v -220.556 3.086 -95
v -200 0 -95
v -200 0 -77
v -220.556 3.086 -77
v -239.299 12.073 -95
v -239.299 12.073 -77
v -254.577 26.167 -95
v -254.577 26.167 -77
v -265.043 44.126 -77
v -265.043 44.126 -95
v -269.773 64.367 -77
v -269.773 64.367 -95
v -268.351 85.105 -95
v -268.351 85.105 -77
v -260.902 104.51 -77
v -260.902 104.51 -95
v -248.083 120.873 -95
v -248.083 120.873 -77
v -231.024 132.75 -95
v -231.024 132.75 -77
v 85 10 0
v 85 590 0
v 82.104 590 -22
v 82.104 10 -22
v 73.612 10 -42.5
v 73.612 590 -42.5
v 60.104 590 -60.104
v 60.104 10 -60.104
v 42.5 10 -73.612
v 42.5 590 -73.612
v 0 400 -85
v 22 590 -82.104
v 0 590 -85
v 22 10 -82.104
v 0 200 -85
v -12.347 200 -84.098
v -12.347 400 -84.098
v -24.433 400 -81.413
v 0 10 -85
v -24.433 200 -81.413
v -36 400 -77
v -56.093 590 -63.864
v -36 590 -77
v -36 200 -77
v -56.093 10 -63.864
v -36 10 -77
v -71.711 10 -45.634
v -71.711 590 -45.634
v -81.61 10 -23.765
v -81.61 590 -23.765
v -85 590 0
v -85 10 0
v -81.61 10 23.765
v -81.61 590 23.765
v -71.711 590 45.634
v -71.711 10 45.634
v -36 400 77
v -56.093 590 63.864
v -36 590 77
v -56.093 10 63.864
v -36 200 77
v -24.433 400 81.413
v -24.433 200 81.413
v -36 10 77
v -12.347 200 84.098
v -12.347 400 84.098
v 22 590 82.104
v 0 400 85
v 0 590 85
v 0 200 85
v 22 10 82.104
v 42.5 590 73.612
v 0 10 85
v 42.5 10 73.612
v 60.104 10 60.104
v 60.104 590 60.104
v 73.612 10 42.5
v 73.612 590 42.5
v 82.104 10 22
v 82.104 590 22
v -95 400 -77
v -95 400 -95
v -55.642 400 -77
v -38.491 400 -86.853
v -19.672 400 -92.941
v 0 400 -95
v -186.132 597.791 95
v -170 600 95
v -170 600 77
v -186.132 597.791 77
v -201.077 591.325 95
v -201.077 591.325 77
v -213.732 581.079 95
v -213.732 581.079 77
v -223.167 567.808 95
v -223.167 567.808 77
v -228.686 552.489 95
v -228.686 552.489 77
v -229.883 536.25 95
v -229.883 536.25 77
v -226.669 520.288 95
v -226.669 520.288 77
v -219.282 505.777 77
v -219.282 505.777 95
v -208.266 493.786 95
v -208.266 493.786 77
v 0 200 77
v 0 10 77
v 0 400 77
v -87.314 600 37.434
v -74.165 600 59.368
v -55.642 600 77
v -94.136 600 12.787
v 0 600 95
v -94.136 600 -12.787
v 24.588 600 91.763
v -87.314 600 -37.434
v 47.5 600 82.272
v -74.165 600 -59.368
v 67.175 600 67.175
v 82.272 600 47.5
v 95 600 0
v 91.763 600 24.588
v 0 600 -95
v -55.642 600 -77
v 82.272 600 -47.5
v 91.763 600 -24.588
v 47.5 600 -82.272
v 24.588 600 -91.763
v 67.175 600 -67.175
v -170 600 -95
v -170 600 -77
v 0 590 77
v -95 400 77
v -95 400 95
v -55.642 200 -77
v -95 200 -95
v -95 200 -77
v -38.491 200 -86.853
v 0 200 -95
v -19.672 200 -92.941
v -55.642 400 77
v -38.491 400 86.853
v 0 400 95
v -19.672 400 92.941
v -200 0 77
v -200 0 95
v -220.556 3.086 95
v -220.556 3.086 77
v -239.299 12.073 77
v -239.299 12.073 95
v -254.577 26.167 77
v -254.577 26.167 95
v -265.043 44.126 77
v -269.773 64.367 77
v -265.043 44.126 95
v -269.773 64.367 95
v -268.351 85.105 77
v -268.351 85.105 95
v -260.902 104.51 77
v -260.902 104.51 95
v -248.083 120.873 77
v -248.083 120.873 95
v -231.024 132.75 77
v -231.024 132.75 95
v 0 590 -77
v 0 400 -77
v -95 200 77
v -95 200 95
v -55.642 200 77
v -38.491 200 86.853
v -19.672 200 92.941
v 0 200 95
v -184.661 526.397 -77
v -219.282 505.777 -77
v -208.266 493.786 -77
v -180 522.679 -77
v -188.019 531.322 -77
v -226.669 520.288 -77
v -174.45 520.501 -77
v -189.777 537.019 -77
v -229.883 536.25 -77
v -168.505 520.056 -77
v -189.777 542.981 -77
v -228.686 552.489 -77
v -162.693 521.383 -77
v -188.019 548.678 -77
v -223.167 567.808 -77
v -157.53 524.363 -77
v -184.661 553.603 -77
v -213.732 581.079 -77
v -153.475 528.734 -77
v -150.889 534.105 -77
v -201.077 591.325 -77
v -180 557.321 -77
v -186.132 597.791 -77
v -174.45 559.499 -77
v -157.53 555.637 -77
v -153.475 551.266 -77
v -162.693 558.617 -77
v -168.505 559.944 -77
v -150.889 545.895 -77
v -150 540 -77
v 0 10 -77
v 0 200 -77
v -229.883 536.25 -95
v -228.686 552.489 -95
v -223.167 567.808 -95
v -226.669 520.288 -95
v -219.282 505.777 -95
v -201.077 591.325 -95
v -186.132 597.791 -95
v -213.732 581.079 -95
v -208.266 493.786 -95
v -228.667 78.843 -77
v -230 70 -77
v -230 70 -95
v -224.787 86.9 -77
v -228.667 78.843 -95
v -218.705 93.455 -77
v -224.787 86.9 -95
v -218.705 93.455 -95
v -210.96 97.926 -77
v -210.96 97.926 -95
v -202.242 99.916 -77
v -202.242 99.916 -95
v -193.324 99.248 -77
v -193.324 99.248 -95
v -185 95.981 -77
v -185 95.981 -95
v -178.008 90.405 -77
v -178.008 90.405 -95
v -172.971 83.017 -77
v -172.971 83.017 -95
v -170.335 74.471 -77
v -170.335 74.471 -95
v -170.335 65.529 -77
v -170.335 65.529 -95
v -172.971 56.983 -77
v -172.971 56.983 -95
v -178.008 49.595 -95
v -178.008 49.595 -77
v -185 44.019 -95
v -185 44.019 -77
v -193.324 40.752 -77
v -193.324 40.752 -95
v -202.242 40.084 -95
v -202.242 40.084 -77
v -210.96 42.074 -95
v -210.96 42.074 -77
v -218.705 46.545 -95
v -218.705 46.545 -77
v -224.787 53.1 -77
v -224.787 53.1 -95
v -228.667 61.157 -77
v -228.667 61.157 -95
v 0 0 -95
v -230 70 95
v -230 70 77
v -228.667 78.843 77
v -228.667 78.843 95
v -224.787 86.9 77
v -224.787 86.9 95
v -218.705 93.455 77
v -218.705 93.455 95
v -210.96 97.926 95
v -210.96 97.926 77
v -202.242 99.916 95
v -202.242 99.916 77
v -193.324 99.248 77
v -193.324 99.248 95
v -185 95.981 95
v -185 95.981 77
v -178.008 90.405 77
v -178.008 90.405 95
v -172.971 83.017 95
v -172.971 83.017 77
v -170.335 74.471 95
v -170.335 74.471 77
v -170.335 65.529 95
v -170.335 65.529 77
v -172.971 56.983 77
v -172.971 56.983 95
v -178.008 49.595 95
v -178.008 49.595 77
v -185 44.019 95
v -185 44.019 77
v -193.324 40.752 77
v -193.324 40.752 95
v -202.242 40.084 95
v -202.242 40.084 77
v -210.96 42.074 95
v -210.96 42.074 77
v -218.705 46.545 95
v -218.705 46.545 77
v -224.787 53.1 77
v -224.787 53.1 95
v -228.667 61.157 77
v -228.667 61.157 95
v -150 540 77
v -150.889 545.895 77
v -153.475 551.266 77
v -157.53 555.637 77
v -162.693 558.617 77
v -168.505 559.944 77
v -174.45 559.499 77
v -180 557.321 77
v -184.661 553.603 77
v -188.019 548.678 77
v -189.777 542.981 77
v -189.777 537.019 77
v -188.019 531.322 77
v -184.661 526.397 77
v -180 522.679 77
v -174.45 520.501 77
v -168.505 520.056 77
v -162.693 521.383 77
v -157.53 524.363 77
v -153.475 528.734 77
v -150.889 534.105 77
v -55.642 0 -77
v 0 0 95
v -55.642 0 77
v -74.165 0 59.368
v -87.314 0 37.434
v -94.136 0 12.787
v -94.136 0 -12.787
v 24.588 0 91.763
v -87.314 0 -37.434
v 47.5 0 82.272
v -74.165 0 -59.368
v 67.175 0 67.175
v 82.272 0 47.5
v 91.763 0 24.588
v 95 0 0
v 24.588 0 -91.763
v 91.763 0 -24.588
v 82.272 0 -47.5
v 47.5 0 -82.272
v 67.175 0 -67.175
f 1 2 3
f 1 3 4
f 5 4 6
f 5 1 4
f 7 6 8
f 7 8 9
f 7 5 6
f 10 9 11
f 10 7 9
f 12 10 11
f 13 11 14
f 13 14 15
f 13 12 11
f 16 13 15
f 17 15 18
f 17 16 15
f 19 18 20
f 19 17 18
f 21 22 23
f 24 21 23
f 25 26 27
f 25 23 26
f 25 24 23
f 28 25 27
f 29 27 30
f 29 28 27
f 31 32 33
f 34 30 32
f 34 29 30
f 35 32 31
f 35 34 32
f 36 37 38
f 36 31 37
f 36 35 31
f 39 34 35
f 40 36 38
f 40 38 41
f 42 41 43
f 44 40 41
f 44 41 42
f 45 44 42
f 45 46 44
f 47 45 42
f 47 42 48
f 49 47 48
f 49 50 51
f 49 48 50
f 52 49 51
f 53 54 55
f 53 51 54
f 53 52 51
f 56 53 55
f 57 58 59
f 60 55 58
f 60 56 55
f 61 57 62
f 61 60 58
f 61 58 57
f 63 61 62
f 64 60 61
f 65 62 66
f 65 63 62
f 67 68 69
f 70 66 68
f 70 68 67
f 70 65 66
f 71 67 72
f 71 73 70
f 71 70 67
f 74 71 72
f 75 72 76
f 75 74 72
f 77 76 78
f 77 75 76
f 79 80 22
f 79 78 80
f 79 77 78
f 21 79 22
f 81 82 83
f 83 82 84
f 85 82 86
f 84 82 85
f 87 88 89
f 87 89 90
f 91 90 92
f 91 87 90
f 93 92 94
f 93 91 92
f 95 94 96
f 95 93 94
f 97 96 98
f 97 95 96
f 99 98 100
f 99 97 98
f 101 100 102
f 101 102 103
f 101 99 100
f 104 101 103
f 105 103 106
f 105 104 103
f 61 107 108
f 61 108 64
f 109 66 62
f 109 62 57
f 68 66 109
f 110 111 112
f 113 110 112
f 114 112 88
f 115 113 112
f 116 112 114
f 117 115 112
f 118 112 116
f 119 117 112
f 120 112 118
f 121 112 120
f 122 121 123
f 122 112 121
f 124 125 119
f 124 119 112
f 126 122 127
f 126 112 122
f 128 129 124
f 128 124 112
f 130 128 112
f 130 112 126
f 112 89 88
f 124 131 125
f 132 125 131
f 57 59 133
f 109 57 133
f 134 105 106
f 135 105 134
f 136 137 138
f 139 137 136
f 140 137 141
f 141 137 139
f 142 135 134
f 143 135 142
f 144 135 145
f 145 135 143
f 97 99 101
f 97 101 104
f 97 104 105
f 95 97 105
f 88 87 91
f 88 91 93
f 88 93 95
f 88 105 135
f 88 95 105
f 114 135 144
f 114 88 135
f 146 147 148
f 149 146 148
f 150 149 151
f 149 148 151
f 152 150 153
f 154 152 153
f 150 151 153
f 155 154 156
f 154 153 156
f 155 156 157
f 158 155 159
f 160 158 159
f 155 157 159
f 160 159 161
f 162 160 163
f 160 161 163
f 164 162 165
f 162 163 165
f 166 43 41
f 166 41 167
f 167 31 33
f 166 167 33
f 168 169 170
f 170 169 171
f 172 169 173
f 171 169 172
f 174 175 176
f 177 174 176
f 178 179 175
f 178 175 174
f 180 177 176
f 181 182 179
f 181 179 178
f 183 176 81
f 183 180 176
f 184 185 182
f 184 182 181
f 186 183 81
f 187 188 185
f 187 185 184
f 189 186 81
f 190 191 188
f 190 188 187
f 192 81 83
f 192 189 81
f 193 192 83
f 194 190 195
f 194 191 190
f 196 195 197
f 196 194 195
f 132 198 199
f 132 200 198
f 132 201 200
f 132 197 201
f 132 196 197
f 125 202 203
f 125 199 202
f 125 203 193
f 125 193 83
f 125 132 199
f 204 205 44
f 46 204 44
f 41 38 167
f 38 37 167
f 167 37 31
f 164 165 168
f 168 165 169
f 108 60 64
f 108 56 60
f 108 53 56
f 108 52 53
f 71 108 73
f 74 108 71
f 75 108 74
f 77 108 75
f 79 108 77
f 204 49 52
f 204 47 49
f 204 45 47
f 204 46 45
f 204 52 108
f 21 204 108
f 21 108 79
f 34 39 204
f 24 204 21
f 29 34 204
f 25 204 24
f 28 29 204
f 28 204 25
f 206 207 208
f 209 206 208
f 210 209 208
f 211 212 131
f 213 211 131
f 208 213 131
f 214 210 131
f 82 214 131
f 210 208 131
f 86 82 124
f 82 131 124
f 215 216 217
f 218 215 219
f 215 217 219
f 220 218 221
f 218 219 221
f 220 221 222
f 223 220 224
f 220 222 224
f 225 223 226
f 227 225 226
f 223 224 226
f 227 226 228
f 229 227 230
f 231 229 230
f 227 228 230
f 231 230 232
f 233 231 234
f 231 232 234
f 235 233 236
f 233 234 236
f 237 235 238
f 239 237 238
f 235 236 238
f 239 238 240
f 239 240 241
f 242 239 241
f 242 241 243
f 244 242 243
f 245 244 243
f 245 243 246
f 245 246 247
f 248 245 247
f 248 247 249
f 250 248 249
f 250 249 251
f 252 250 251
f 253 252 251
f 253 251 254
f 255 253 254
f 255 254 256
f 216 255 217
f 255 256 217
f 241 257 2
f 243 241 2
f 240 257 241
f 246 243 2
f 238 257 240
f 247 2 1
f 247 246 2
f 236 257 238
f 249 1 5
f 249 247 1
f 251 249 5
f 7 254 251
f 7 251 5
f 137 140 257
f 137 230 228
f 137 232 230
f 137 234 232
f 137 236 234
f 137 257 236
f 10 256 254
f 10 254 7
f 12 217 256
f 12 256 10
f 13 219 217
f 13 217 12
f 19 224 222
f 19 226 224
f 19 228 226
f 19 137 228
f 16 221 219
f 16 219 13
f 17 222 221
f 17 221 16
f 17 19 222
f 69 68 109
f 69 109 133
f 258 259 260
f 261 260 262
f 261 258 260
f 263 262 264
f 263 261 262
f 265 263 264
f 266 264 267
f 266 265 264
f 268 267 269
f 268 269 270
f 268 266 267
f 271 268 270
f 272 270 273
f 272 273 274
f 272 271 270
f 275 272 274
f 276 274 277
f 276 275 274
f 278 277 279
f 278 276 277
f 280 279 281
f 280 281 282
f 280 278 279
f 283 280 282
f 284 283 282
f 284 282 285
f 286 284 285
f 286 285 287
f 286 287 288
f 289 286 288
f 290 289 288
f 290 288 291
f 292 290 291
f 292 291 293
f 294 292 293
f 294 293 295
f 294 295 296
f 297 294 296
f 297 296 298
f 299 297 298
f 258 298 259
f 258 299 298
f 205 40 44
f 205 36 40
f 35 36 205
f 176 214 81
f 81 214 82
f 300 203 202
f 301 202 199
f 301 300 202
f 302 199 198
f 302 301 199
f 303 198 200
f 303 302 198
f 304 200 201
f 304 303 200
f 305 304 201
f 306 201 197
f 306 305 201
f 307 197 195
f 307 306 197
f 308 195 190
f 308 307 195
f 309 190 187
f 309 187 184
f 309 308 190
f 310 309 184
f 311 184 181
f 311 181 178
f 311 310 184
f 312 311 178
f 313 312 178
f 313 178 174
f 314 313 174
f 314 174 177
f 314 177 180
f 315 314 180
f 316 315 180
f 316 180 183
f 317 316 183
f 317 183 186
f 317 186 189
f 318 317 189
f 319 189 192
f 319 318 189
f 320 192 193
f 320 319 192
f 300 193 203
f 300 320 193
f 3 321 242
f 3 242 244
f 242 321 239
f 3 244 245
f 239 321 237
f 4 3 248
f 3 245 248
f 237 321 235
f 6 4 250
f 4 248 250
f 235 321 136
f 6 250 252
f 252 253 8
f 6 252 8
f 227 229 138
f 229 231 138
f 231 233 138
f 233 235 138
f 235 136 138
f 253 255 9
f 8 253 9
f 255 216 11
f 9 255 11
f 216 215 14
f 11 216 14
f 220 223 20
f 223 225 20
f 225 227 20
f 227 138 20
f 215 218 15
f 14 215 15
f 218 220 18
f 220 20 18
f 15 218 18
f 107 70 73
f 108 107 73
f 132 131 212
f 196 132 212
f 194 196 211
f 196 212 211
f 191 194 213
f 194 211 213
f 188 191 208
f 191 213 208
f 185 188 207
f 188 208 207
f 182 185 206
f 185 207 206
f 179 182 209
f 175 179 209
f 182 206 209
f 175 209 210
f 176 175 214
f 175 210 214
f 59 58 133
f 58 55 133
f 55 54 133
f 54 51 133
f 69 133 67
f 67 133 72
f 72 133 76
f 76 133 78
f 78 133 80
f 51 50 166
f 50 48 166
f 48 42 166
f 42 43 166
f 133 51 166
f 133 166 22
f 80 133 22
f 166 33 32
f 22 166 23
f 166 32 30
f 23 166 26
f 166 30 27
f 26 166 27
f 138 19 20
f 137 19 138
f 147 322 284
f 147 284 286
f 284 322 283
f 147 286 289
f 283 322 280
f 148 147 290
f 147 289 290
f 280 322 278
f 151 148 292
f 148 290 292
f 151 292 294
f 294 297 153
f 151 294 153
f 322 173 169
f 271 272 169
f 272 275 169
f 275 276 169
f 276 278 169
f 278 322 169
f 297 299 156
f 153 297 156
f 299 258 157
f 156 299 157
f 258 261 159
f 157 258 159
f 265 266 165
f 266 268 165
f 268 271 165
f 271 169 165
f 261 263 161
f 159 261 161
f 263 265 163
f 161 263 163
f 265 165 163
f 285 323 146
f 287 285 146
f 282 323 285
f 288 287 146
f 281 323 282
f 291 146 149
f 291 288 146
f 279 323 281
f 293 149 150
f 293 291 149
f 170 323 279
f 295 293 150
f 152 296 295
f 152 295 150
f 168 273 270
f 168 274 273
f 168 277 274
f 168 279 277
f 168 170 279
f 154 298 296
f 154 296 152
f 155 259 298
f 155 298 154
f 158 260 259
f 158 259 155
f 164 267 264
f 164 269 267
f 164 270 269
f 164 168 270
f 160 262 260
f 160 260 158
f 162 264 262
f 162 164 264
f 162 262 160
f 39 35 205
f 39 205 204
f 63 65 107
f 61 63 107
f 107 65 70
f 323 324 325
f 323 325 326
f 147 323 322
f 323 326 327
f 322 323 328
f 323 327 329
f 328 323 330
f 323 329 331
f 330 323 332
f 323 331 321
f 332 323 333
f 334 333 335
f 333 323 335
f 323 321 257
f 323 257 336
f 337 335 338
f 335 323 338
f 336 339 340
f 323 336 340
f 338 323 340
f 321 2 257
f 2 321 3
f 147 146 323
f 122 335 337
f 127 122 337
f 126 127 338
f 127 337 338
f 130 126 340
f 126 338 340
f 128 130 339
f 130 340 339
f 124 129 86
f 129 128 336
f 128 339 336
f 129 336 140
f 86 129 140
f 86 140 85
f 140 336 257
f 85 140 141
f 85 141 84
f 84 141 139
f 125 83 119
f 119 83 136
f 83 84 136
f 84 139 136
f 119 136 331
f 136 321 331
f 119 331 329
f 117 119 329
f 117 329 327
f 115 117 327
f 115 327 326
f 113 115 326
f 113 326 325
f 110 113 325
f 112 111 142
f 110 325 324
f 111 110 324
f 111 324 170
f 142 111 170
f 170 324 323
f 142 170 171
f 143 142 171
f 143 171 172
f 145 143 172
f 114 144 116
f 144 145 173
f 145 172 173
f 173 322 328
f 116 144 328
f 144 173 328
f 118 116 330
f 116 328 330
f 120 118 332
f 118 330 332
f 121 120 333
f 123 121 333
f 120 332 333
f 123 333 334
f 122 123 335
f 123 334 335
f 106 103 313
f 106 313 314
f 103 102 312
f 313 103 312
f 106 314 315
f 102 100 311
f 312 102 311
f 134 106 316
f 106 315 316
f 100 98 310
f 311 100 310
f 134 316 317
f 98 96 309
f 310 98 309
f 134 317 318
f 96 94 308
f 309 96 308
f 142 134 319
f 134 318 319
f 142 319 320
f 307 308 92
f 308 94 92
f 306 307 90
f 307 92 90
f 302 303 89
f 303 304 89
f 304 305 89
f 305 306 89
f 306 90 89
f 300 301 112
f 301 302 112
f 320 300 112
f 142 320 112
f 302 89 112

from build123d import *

# Parameters (mm, degrees)
SKETCH1_R           = 95
BOSS_EXTRUDE1_DEPTH = 600
SHELL1_T            = 10
SKETCH2_R           = 30
BOSS_EXTRUDE2_DEPTH = 18
SKETCH4_R           = 20
BOSS_EXTRUDE3_DEPTH = 95


with BuildPart() as part:
    # Sketch1 → Boss-Extrude1 (new body)
    with BuildSketch(Plane(origin=(0, 0, 0), x_dir=(1, 0, 0), z_dir=(0, 1, 0))):
        Circle(SKETCH1_R)
    extrude(amount=BOSS_EXTRUDE1_DEPTH)

    # Shell1 (no face opened: a closed hollow body)
    add(offset(amount=-SHELL1_T, mode=Mode.PRIVATE), mode=Mode.SUBTRACT)

    # Sketch2 → Boss-Extrude2 (add)
    with BuildSketch(Plane(origin=(0, 0, -95), x_dir=(-1, 0, 0), z_dir=(0, 0, -1))):
        with BuildLine():
            Line((0, 0), (95, 0))
            Line((95, 0), (200, 0))
            ThreePointArc((200, 0), (268.163356789, 54.070254514), (231.023569289, 132.749805964))
            Line((231.023569289, 132.749805964), (95, 200))
            Line((95, 200), (0, 200))
            Line((0, 200), (0, 0))
        make_face()
        with Locations((200, 70)):
            Circle(SKETCH2_R, mode=Mode.SUBTRACT)
        with BuildLine():
            Line((0, 600), (95, 600))
            Line((95, 600), (170, 600))
            ThreePointArc((170, 600), (226.448348767, 560.336762809), (208.265889327, 493.786130718))
            Line((208.265889327, 493.786130718), (95, 400))
            Line((95, 400), (0, 400))
            Line((0, 400), (0, 600))
        make_face()
    boss_extrude2 = extrude(amount=-BOSS_EXTRUDE2_DEPTH)

    # Mirror1: Boss-Extrude2 across plane
    add(boss_extrude2.mirror(Plane(origin=(0, 0, 0), x_dir=(1, 0, 0), z_dir=(0, 0, -1))))

    # Sketch4 → Boss-Extrude3 (add, symmetric)
    with BuildSketch(Plane.XY):
        with Locations((-170, 540)):
            Circle(SKETCH4_R)
    extrude(amount=BOSS_EXTRUDE3_DEPTH, both=True)


solid = part.part
